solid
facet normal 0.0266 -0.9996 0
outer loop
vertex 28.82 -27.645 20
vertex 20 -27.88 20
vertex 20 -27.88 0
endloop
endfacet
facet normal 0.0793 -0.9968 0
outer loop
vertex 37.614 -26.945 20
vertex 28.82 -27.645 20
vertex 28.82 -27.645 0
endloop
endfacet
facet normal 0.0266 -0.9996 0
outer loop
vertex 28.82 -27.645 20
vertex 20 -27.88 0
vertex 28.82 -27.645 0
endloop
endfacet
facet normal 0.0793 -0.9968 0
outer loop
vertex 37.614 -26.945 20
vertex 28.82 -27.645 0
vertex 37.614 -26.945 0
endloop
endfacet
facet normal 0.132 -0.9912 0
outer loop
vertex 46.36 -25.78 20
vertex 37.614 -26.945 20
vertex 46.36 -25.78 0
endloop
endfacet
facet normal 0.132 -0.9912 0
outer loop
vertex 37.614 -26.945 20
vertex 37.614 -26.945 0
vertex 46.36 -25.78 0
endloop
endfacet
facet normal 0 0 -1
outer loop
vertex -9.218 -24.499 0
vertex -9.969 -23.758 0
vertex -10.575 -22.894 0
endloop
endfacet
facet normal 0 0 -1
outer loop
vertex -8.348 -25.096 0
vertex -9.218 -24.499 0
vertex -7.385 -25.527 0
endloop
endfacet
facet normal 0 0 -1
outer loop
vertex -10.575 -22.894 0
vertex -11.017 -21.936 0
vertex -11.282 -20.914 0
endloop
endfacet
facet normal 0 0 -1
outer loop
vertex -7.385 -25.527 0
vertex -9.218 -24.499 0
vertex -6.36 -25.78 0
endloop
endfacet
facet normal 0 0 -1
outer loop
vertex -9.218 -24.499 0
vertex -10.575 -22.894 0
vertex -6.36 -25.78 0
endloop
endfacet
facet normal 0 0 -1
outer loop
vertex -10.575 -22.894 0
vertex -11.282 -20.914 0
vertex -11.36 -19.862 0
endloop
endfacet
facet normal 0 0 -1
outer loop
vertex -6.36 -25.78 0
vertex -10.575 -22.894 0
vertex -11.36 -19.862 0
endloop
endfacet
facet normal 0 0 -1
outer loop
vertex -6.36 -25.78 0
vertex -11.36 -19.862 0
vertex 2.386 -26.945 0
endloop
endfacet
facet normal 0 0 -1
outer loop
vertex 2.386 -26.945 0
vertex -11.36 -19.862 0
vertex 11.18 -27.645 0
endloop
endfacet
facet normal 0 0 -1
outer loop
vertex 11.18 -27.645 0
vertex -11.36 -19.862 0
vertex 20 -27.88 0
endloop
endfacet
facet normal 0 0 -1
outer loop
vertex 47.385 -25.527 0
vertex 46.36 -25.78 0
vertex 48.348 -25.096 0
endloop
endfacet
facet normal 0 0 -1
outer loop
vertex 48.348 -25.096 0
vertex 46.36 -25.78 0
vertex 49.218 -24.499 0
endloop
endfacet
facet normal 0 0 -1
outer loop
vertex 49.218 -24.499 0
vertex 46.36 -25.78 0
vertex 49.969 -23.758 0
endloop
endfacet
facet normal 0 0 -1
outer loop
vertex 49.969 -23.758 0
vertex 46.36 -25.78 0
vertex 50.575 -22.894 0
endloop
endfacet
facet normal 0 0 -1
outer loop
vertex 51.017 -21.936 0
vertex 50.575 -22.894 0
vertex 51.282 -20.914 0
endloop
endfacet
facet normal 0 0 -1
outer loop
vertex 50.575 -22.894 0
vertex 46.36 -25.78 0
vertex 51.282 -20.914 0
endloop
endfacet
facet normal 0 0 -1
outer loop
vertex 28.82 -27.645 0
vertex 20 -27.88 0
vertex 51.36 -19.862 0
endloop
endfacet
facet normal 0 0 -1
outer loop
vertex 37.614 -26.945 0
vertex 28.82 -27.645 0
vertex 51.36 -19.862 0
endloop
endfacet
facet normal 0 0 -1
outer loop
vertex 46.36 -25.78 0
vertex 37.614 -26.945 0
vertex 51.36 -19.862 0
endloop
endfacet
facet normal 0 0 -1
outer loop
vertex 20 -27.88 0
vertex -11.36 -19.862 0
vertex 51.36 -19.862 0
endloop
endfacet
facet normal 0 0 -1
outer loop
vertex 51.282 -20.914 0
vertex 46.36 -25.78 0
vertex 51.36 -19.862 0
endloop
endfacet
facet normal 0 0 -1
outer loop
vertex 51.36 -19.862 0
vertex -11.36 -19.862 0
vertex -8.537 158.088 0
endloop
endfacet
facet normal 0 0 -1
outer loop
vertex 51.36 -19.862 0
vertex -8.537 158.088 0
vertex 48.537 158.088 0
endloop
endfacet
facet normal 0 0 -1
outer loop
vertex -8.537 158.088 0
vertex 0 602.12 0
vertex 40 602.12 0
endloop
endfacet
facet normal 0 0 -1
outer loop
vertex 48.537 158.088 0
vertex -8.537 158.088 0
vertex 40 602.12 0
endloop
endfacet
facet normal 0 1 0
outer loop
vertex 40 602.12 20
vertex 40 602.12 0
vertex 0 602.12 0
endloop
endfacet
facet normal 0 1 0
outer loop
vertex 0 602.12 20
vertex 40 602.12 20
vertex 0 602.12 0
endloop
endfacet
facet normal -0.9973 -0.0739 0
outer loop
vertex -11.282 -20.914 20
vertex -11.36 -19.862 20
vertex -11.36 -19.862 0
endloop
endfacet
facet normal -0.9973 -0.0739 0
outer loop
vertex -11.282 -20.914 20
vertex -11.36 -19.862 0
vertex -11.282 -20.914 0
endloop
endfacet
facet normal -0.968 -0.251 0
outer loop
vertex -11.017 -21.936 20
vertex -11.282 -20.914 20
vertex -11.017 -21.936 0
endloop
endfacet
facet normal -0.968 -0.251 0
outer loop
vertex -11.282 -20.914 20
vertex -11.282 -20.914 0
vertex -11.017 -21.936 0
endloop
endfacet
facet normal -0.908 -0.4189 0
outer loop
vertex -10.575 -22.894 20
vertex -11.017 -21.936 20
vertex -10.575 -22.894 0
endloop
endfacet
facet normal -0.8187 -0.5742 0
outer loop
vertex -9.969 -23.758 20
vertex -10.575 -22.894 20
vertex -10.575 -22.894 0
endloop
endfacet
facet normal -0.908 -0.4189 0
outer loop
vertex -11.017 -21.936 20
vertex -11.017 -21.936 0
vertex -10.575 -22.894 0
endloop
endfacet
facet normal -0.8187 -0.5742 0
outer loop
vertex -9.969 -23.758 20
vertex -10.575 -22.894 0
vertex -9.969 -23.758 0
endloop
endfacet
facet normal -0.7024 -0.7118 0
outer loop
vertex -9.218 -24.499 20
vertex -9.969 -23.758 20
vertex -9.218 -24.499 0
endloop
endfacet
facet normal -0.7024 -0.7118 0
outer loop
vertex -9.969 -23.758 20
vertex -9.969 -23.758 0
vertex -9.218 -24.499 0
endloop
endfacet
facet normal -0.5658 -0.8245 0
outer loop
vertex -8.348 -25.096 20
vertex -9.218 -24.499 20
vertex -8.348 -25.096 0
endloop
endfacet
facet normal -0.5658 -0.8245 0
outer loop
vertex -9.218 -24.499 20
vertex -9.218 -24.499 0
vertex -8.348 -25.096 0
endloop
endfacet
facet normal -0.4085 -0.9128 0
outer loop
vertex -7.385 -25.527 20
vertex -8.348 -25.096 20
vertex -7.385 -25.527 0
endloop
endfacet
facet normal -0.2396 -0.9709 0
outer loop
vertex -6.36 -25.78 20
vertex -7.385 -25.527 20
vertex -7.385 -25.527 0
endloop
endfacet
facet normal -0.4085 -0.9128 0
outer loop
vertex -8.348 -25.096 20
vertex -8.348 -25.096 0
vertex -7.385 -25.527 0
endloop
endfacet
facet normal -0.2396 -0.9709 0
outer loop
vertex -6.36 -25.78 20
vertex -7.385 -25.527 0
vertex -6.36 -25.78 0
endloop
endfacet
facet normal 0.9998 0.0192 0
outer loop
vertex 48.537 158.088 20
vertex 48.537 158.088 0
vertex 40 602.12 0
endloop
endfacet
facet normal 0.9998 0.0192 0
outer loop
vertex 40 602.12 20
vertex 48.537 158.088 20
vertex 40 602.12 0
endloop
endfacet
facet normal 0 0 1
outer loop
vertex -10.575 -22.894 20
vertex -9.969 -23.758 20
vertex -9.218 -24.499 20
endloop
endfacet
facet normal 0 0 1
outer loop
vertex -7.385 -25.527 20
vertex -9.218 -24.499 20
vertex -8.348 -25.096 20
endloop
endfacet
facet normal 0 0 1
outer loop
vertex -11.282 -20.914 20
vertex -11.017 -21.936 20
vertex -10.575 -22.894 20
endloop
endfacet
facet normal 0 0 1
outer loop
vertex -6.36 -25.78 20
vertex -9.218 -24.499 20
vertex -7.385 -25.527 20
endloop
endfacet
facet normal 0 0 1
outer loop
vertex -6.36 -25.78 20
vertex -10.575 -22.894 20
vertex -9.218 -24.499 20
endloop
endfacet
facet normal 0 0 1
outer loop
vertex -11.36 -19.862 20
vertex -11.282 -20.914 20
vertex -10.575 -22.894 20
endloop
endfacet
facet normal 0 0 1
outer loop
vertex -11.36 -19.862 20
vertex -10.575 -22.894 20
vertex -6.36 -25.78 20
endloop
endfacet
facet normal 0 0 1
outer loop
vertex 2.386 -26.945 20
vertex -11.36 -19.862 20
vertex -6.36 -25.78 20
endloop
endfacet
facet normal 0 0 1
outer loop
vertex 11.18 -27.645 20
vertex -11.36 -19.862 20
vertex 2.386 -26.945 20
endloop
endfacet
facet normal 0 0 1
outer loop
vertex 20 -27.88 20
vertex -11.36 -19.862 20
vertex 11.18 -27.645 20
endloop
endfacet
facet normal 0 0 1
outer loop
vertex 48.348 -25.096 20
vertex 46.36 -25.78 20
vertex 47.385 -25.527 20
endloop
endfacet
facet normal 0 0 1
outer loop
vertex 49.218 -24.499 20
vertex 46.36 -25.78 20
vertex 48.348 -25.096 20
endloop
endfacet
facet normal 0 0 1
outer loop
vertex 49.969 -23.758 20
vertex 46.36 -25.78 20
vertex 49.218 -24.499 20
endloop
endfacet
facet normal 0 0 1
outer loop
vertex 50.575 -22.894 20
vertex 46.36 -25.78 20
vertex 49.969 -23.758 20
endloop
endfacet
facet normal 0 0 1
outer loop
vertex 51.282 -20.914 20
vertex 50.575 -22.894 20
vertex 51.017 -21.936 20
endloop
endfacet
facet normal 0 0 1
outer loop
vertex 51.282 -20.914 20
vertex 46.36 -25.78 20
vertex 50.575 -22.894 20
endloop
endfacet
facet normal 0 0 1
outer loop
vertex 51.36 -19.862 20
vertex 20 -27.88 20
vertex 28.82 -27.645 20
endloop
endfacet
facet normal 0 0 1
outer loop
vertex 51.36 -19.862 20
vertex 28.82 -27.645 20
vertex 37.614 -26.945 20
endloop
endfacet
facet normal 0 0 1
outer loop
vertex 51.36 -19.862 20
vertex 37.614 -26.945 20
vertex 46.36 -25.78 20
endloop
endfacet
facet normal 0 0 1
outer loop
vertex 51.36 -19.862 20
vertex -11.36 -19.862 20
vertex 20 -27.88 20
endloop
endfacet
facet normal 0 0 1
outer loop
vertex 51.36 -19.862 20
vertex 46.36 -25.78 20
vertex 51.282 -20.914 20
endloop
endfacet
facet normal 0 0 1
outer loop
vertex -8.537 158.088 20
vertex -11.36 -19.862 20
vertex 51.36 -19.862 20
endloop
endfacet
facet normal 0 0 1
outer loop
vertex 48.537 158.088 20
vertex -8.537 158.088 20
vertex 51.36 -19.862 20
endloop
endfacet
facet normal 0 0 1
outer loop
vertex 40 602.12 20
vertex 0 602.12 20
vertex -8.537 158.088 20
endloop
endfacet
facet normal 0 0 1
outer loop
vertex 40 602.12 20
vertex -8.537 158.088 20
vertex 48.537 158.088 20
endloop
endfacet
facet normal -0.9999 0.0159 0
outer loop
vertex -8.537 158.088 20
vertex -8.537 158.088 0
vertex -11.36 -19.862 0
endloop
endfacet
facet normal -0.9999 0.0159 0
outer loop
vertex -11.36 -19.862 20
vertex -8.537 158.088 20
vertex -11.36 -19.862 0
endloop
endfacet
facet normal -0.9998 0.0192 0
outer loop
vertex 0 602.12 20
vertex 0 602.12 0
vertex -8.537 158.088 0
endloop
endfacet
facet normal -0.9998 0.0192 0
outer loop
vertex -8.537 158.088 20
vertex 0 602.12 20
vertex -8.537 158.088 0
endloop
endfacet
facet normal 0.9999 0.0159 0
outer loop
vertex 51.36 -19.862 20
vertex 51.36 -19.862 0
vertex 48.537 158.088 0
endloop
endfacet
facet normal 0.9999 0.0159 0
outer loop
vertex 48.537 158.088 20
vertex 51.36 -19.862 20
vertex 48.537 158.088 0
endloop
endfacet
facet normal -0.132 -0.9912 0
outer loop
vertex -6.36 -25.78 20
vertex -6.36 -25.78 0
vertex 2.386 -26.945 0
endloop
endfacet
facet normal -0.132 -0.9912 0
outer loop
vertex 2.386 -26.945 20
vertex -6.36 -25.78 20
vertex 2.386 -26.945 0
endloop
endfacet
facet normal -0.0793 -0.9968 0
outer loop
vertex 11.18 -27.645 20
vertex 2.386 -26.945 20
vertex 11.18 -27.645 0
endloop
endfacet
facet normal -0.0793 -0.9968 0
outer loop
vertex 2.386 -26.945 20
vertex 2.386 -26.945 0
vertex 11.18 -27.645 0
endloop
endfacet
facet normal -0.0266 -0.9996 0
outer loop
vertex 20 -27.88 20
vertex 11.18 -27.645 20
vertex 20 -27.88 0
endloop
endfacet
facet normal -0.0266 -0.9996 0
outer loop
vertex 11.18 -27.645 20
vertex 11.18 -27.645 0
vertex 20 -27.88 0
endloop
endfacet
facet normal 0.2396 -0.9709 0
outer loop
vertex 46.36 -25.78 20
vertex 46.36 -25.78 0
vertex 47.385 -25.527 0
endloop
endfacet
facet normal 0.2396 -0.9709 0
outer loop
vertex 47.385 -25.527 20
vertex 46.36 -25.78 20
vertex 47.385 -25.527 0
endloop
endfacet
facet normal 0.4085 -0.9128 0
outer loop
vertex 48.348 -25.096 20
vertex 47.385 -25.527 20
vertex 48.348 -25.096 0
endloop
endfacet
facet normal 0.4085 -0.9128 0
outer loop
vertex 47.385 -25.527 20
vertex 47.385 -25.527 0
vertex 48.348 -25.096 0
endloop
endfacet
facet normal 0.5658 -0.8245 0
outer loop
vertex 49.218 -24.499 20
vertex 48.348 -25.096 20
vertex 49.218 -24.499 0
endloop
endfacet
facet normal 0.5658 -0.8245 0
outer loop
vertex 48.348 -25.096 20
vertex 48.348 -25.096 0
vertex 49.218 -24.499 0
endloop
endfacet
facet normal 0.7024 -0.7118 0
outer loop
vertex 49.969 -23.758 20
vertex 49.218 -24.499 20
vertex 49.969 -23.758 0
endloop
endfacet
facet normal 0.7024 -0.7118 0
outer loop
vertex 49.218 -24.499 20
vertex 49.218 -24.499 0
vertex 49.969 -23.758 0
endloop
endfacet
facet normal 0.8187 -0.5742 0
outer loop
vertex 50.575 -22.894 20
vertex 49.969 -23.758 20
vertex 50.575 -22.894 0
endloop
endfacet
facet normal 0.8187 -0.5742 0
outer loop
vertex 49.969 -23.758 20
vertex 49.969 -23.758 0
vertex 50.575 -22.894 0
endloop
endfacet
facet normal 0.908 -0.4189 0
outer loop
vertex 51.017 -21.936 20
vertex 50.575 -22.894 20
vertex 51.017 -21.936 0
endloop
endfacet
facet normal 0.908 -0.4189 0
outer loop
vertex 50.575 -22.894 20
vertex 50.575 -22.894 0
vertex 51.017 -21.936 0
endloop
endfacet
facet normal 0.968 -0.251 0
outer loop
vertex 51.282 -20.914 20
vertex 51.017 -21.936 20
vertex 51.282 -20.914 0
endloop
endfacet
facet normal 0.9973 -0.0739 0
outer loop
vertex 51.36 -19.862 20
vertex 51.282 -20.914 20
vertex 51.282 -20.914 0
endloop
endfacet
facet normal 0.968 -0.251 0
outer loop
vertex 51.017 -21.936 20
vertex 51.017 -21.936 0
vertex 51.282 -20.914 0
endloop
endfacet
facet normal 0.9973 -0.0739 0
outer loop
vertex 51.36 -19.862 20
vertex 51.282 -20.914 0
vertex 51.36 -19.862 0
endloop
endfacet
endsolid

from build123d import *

# Parameters (mm, degrees)
F1_DEPTH = 20


with BuildPart() as f1:
    # F0 (on Top) → F1 (new body)
    with BuildSketch(Plane.XY):
        with BuildLine():
            Line((0, 602.120165), (-8.537433, 158.088193))
            Line((-8.537433, 158.088193), (-11.36, -19.861807))
            ThreePointArc((-11.36, -19.861807), (-9.968781, -23.757604), (-6.36, -25.779835))
            ThreePointArc((-6.36, -25.779835), (6.778319, -27.353029), (20, -27.879835))
            ThreePointArc((20, -27.879835), (33.221681, -27.353029), (46.36, -25.779835))
            ThreePointArc((46.36, -25.779835), (49.968781, -23.757604), (51.36, -19.861807))
            Line((51.36, -19.861807), (48.537433, 158.088193))
            Line((48.537433, 158.088193), (40, 602.120165))
            Line((40, 602.120165), (20, 602.120165))
            Line((20, 602.120165), (0, 602.120165))
        make_face()
    extrude(amount=F1_DEPTH)


solid = f1.part
